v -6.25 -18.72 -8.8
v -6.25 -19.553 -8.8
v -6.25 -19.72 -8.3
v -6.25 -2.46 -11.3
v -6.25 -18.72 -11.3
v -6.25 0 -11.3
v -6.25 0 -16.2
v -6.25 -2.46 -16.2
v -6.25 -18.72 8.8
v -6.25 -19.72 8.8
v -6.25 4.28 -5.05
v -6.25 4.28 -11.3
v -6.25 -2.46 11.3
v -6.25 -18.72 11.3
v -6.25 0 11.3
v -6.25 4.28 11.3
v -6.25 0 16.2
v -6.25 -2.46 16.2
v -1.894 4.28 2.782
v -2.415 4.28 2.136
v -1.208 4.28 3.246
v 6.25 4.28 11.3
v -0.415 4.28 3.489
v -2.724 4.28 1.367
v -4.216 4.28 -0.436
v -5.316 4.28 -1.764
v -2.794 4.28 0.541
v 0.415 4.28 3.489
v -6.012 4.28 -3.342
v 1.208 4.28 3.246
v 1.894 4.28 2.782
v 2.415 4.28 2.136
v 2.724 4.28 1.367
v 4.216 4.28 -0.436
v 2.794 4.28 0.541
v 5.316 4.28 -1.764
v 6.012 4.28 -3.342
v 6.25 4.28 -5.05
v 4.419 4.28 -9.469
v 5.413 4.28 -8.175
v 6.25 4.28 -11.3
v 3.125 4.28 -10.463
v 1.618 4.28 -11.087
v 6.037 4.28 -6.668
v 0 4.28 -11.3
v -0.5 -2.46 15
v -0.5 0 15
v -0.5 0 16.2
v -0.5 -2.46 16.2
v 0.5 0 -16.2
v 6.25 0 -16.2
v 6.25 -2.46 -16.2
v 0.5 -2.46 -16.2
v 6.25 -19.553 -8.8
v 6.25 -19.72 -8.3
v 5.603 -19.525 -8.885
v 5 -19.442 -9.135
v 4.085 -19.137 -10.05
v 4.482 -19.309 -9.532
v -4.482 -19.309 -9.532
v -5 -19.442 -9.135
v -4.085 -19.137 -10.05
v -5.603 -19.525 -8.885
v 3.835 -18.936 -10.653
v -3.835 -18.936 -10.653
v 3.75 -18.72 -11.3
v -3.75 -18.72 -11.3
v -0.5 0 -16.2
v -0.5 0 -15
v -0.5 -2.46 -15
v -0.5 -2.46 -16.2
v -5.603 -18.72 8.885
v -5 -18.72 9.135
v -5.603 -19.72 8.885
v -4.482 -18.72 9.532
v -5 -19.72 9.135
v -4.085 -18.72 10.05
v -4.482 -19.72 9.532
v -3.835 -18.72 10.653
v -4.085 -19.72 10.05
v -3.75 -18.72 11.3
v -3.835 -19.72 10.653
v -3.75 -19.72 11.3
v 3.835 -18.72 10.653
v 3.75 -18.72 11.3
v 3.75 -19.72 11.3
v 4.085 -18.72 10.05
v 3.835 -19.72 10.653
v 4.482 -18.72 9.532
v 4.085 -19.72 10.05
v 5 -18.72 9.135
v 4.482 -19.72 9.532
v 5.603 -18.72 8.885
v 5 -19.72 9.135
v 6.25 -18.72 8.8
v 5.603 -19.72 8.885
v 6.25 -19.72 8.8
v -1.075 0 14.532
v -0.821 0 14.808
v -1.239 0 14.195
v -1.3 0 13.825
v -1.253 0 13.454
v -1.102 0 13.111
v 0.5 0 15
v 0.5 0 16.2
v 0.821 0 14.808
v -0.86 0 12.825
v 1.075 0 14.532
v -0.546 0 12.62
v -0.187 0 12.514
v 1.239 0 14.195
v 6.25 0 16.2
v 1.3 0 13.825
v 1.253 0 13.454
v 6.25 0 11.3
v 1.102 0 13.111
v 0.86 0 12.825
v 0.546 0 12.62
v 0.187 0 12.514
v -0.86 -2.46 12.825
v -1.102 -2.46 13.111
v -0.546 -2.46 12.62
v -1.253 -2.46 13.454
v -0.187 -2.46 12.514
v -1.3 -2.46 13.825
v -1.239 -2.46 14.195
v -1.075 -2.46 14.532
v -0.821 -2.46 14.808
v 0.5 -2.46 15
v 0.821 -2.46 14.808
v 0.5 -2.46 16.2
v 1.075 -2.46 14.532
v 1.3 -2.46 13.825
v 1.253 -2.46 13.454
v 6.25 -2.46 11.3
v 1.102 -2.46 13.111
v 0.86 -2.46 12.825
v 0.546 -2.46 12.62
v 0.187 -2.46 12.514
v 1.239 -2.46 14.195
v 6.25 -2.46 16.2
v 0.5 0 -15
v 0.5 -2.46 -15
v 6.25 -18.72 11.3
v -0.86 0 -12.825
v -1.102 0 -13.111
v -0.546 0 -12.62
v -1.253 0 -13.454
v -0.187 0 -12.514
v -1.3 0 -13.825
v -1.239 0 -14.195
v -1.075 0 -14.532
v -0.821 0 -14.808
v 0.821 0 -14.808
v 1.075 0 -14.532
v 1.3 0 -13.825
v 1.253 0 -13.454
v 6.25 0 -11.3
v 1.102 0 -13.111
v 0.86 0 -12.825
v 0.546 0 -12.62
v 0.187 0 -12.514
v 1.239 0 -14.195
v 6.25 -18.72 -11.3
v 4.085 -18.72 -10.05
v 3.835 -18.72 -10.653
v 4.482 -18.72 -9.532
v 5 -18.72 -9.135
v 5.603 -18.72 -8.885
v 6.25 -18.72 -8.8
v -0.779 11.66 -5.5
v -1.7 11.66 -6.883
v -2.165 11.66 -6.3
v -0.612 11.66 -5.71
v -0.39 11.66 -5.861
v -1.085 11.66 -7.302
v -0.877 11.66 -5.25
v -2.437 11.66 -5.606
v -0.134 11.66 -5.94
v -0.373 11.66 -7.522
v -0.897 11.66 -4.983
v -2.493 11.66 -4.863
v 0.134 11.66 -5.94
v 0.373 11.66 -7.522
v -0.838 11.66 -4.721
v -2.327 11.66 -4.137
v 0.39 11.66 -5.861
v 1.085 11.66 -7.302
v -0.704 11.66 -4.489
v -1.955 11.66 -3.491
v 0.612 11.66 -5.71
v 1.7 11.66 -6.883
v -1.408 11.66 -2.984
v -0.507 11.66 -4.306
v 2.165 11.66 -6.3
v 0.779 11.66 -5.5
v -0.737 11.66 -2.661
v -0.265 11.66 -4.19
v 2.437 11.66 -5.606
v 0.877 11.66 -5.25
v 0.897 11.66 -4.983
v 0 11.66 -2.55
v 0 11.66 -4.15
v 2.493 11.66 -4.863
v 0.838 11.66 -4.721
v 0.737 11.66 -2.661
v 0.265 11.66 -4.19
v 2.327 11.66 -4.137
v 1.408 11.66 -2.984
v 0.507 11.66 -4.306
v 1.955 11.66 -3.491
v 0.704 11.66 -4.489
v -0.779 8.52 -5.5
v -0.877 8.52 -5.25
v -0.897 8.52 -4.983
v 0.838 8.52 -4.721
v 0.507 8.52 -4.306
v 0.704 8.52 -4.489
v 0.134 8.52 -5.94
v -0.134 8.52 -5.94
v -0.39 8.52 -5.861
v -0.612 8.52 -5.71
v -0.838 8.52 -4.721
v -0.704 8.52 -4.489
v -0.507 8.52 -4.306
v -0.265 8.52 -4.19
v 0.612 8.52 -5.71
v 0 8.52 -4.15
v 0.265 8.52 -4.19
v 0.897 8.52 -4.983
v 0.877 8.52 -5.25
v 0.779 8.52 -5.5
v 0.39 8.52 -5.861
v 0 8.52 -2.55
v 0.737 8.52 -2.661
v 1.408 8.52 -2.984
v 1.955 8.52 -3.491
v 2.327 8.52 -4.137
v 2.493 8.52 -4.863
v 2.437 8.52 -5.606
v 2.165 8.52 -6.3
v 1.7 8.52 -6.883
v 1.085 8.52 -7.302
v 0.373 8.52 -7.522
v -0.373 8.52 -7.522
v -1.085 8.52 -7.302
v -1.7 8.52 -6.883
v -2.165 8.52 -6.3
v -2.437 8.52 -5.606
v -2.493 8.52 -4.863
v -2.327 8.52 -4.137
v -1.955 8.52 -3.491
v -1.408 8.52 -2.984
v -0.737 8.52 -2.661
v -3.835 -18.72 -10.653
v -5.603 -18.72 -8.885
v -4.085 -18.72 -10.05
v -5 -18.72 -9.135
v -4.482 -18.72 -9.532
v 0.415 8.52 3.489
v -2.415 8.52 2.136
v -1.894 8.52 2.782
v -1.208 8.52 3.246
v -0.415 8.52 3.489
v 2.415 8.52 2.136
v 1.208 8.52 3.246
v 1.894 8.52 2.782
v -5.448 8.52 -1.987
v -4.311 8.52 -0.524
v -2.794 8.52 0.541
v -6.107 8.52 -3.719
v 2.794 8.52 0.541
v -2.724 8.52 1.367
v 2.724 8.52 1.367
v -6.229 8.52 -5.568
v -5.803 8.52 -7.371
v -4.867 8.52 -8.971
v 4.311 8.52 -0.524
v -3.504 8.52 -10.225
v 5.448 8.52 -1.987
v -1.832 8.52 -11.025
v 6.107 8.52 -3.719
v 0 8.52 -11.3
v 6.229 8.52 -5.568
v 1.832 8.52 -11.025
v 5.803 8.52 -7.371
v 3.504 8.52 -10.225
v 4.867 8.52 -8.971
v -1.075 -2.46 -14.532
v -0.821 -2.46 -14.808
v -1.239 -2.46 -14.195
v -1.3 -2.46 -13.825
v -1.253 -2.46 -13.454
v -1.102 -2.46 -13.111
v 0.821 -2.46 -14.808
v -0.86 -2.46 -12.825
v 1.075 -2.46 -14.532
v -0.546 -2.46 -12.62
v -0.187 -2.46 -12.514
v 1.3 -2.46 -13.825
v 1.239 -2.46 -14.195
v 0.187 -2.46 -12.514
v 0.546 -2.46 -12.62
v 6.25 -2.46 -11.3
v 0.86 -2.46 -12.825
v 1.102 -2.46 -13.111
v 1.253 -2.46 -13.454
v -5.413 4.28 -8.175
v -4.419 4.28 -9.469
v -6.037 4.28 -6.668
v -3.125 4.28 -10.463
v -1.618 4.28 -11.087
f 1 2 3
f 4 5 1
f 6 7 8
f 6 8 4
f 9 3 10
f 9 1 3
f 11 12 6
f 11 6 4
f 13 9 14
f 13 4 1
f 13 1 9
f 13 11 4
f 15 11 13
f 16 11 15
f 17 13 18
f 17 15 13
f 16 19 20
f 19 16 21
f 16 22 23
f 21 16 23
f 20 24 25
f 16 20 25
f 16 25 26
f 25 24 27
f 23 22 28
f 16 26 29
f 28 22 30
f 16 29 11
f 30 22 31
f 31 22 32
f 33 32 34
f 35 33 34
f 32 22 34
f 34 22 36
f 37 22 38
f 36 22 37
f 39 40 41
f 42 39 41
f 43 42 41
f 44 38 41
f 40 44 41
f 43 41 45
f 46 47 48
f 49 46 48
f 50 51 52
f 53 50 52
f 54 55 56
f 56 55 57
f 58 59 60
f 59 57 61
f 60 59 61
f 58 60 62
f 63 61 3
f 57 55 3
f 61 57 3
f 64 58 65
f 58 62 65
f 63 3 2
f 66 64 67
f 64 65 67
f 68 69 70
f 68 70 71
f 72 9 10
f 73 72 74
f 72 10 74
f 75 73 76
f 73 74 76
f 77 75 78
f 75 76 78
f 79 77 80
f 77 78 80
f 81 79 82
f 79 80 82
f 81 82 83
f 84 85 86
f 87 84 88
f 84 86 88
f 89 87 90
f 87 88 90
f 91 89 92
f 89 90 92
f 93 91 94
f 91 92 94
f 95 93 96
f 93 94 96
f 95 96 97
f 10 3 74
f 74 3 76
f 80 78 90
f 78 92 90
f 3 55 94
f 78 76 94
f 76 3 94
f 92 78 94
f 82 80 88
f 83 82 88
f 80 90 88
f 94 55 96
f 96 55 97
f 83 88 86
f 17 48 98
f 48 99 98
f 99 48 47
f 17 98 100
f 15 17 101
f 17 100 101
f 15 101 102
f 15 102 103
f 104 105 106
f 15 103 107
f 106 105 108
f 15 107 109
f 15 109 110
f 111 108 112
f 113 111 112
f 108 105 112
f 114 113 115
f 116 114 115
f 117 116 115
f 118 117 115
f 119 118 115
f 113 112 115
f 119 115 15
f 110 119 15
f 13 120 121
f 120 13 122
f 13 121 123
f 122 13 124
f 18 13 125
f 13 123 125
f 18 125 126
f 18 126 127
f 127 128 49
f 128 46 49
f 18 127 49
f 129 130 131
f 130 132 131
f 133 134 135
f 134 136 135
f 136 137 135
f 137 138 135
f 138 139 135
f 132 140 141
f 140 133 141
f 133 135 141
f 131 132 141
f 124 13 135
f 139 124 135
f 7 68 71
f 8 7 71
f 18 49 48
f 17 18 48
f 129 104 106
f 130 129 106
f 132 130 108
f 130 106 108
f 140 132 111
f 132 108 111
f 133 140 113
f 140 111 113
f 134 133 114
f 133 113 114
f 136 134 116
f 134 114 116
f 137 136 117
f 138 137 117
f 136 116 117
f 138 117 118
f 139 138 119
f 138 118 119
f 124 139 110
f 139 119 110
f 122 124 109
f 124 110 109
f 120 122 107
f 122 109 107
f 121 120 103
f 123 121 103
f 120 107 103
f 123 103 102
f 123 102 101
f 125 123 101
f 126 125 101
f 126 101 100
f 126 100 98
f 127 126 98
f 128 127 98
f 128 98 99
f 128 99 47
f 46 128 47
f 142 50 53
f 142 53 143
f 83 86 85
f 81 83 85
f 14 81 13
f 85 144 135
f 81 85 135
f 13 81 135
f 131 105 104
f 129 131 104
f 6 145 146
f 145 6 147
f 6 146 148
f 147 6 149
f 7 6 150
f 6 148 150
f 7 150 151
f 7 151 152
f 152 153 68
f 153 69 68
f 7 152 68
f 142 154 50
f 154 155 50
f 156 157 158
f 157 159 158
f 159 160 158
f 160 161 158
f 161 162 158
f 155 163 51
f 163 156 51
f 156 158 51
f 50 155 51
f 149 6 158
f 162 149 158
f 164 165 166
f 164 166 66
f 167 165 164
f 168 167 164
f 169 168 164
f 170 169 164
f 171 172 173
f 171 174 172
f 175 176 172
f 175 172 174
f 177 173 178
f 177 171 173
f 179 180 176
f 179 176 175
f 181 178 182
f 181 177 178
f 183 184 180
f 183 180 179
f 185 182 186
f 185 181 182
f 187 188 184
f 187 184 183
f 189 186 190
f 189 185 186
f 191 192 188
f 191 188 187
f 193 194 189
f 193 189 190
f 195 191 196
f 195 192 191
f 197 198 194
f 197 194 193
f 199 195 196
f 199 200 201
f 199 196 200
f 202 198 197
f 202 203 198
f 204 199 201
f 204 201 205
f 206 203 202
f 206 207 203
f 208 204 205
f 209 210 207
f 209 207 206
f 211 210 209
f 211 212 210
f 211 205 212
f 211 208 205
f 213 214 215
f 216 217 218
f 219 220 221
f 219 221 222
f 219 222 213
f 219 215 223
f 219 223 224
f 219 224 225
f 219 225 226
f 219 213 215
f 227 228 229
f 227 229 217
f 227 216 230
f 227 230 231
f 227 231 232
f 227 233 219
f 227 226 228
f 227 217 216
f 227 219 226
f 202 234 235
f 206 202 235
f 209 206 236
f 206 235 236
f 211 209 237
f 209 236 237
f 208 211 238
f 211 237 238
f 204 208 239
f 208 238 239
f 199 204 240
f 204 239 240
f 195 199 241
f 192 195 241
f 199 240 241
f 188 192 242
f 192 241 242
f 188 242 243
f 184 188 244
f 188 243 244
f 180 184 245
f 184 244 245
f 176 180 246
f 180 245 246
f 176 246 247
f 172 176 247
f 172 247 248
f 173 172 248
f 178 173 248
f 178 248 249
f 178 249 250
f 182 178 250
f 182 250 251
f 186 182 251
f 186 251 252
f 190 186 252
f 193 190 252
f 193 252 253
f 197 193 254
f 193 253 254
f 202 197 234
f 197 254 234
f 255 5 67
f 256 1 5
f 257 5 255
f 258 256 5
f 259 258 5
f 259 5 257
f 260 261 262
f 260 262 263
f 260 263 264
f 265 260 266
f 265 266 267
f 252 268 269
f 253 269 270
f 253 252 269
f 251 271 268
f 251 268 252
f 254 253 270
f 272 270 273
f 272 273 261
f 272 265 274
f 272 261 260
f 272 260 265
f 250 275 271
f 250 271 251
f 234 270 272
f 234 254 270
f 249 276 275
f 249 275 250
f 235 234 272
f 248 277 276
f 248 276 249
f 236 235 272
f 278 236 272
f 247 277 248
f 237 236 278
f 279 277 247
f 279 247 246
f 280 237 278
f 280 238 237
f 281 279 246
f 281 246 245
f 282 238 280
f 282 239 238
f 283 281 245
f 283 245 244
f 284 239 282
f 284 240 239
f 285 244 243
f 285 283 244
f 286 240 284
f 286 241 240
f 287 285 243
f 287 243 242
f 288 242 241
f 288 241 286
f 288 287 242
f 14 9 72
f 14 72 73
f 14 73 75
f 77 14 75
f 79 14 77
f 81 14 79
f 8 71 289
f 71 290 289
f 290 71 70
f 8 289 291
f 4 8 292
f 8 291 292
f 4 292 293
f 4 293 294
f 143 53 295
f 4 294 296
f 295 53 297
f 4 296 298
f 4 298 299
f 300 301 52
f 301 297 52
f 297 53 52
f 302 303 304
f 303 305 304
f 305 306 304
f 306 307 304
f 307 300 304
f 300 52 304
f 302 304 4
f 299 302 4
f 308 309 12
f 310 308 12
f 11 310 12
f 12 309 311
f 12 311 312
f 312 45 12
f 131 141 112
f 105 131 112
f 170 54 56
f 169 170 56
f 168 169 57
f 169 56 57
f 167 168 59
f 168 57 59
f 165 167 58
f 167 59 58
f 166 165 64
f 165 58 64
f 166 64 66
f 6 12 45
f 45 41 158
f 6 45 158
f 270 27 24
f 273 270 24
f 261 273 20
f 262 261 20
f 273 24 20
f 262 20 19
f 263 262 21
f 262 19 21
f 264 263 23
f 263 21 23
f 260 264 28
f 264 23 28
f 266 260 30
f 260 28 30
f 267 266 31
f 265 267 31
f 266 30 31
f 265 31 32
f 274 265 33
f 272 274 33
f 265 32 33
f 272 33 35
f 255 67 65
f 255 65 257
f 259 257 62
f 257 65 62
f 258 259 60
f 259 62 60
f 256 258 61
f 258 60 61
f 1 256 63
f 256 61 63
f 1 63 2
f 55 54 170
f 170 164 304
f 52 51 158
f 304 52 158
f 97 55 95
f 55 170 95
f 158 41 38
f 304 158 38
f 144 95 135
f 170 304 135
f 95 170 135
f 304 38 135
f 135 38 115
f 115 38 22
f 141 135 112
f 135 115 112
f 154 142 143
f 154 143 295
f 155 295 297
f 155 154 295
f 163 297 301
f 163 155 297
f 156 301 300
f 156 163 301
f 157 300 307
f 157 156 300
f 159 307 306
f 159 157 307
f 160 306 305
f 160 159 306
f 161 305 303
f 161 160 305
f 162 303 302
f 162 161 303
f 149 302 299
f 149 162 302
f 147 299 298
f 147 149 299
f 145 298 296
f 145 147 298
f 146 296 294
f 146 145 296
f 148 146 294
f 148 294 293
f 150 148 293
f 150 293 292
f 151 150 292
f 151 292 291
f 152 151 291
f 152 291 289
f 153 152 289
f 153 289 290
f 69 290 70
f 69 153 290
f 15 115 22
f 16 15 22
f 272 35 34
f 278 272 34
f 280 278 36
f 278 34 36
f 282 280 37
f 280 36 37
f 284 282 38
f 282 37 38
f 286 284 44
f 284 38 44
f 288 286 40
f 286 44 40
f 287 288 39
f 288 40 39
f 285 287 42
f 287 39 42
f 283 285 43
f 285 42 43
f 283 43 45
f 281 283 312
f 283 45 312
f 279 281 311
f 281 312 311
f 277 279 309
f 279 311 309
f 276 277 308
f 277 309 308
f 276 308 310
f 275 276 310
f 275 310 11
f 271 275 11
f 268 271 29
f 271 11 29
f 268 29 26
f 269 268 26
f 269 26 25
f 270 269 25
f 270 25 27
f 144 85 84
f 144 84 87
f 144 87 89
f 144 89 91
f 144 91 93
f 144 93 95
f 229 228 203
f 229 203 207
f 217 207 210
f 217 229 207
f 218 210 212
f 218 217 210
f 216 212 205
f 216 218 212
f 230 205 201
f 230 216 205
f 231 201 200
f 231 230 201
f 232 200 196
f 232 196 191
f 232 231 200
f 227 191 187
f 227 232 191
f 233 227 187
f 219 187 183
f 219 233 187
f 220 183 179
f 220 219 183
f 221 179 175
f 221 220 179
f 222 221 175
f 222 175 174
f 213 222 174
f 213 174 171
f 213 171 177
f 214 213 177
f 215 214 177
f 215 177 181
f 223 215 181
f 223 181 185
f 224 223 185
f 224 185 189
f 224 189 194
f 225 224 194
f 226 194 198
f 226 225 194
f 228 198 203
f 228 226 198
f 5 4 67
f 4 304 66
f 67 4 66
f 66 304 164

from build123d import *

# Parameters (mm, degrees)
EXTRUDE_1_DEPTH     = 6.25
CUT_EXTRUDE_1_DEPTH = 12.5
EXTRUDE_2_DEPTH     = 4.24
SKETCH_4_R          = 2.5
SKETCH_4_R_2        = 0.9
EXTRUDE_3_DEPTH     = 3.14
SKETCH_5_R          = 2.5
CUT_EXTRUDE_2_DEPTH = 1
CUT_EXTRUDE_3_REACH = 30.418


with BuildPart() as part:
    # 草图1 → 凸台-拉伸1 (new, symmetric)
    with BuildSketch(Plane(origin=(0, 0, 0), x_dir=(0, 0, -1), z_dir=(1, 0, 0))):
        Polygon((-11.3, 4.28), (11.3, 4.28), (11.3, 0), (16.2, 0), (16.2, -2.46), (11.3, -2.46), (11.3, -19.72), (-11.3, -19.72), (-11.3, -2.46), (-16.2, -2.46), (-16.2, 0), (-11.3, 0), align=None)
    extrude(amount=EXTRUDE_1_DEPTH, both=True)

    # 草图2 → 切除-拉伸1 (cut)
    with BuildSketch(Plane(origin=(0, 0, 0), x_dir=(1, 0, 0), z_dir=(0, 1, 0))):
        with BuildLine():
            Line((-0.5, 15), (-0.5, 16.2))
            Line((-0.5, 16.2), (0.5, 16.2))
            Line((0.5, 16.2), (0.5, 15))
            ThreePointArc((0.5, 15), (0, 12.5), (-0.5, 15))
        make_face()
        with BuildLine():
            Line((-0.5, -15), (-0.5, -16.2))
            Line((-0.5, -16.2), (0.5, -16.2))
            Line((0.5, -16.2), (0.5, -15))
            ThreePointArc((0.5, -15), (0, -12.5), (-0.5, -15))
        make_face()
    extrude(amount=-CUT_EXTRUDE_1_DEPTH, mode=Mode.SUBTRACT)

    # 草图3 → 凸台-拉伸2 (add)
    with BuildSketch(Plane(origin=(0, 4.28, 0), x_dir=(1, 0, 0), z_dir=(0, 1, 0))):
        with BuildLine():
            ThreePointArc((2.794246193, -0.540589255), (0, 11.3), (-2.794246193, -0.540589255))
            ThreePointArc((-2.794246193, -0.540589255), (0, -3.52), (2.794246193, -0.540589255))
        make_face()
    extrude(amount=EXTRUDE_2_DEPTH)

    # 草图4 → 凸台-拉伸3 (add)
    with BuildSketch(Plane(origin=(0, 8.52, 0), x_dir=(1, 0, 0), z_dir=(0, 1, 0))):
        with Locations(Location((0, 5.05, 0), (0, 0, 270))):
            Circle(SKETCH_4_R)
        with Locations(Location((0, 5.05, 0), (0, 0, 270))):
            Circle(SKETCH_4_R_2, mode=Mode.SUBTRACT)
    extrude(amount=EXTRUDE_3_DEPTH)

    # 草图5 → 切除-拉伸2 (cut)
    with BuildSketch(Plane.XZ.offset(19.72)):
        with Locations((6.25, 11.3)):
            Circle(SKETCH_5_R)
        with Locations((6.25, -11.3)):
            Circle(SKETCH_5_R)
        with Locations((-6.25, -11.3)):
            Circle(SKETCH_5_R)
        with Locations((-6.25, 11.3)):
            Circle(SKETCH_5_R)
    extrude(amount=-CUT_EXTRUDE_2_DEPTH, mode=Mode.SUBTRACT)

    # 切除-拉伸3: up to this face of the body (flat: up to its plane)
    cut_extrude_3_end = Plane(part.part.faces().sort_by_distance((6.25, -7.338953034, 0))[0])
    # 草图6 → 切除-拉伸3 (cut, up to the picked face)
    with BuildSketch(Plane.ZY.offset(6.25), mode=Mode.PRIVATE) as cut_extrude_3_sk1:
        Polygon((-11.3, -18.72), (-11.3, -19.72), (-8.3, -19.72), align=None)
    cut_extrude_3_tool1 = split(extrude(cut_extrude_3_sk1.sketch, amount=-CUT_EXTRUDE_3_REACH, mode=Mode.PRIVATE), bisect_by=cut_extrude_3_end, keep=Keep.BOTH, mode=Mode.PRIVATE)
    add(cut_extrude_3_tool1.solids().sort_by(Axis((-6.25, -19.386667, -10.3), (1, 0, 0)))[0], mode=Mode.SUBTRACT)


solid = part.part
